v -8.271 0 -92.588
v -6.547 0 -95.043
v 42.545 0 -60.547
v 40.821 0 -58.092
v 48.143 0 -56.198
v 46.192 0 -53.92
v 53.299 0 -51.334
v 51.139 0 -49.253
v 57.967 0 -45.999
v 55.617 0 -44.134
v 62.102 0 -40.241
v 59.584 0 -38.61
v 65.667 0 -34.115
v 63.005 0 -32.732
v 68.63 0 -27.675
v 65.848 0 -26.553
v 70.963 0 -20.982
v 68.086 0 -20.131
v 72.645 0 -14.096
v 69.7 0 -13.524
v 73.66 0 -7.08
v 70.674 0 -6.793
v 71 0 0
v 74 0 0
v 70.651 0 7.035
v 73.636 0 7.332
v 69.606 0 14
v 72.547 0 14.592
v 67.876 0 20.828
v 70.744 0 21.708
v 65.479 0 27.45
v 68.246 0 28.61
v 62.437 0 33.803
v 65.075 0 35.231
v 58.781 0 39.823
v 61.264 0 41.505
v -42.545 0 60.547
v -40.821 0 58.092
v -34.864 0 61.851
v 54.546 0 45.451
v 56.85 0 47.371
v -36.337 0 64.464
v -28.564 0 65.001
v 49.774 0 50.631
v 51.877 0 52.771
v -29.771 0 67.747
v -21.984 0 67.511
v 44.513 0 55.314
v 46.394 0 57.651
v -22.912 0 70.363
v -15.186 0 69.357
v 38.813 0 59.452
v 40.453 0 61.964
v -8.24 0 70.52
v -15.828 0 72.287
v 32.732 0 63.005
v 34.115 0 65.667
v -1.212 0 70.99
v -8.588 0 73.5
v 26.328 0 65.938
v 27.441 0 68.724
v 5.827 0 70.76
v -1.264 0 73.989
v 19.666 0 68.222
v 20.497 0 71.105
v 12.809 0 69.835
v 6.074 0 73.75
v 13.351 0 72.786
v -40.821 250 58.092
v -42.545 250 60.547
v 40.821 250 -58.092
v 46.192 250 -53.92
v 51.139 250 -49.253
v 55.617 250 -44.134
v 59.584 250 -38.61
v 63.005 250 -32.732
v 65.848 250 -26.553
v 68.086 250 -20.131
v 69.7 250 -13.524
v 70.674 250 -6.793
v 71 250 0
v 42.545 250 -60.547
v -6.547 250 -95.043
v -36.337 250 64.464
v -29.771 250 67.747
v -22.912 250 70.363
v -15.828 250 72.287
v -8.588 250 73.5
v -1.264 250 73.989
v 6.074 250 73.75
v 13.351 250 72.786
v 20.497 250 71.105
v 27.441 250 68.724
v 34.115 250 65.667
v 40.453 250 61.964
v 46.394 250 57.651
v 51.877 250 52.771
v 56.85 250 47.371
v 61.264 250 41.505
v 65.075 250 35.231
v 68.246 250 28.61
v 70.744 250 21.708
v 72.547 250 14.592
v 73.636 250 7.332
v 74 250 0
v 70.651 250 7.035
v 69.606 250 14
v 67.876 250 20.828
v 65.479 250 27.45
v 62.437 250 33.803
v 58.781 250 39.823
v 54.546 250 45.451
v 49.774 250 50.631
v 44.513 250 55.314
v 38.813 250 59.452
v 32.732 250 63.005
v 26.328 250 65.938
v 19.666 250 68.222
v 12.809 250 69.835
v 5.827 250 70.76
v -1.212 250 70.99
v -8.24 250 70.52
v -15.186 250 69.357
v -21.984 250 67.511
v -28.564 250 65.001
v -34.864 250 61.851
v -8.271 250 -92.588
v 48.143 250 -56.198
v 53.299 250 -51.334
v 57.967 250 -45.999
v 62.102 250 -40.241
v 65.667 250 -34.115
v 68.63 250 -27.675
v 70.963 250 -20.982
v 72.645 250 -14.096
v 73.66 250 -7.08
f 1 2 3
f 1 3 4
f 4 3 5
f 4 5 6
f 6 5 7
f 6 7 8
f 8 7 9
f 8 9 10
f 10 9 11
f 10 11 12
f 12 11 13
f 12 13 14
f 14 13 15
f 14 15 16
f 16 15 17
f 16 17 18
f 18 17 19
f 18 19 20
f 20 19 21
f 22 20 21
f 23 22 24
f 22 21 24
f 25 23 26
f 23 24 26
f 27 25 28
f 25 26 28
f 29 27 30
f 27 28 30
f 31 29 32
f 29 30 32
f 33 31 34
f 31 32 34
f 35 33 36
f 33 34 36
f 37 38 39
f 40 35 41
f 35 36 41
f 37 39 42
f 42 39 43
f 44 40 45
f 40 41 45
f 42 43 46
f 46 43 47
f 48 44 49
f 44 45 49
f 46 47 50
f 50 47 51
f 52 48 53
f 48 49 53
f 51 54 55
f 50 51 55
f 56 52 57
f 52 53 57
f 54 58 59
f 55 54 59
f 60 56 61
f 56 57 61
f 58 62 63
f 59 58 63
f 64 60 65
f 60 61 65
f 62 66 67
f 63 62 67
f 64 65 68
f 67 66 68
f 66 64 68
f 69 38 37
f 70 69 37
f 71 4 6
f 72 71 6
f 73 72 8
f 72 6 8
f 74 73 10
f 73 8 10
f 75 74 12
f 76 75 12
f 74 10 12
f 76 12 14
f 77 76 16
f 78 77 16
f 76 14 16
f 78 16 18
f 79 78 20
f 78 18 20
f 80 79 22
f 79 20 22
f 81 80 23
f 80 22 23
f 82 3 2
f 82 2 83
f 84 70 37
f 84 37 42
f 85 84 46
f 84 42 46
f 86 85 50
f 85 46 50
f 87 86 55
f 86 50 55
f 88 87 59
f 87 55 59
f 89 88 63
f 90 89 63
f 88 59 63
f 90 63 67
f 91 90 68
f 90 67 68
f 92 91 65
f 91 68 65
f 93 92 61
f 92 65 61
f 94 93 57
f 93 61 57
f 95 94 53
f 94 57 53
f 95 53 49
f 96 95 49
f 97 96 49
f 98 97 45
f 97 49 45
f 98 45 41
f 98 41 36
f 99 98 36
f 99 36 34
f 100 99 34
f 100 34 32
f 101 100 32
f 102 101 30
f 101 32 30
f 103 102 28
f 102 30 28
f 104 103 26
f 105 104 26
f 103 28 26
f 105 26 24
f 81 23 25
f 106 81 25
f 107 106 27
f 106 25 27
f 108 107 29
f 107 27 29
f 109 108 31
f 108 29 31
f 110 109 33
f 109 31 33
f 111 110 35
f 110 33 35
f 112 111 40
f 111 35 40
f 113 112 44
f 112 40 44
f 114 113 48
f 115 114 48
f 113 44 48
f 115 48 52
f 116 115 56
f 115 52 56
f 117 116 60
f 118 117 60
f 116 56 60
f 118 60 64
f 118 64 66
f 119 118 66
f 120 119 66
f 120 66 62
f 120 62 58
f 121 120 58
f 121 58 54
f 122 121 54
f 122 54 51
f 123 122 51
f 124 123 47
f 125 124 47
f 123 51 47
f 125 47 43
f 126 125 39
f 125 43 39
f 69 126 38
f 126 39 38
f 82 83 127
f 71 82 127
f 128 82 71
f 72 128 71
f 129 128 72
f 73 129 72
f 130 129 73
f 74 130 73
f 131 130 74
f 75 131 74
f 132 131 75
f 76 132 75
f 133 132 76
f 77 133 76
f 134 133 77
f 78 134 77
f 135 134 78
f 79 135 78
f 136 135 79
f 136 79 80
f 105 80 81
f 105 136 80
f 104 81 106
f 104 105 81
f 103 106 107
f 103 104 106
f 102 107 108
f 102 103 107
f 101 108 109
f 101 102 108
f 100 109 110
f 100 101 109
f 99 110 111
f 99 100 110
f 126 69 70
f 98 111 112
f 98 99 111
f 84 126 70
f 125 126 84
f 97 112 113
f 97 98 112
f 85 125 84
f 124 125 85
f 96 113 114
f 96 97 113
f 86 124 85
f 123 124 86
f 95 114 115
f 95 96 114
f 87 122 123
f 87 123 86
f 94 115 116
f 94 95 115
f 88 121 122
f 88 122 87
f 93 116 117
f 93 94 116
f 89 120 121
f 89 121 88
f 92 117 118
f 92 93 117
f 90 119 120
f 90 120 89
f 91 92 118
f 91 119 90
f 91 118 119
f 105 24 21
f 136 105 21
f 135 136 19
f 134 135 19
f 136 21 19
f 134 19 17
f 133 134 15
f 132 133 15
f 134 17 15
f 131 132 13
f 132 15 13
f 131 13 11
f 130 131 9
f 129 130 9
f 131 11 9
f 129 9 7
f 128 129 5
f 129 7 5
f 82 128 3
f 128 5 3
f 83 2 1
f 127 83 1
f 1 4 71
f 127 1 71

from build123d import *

# Parameters (mm, degrees)
BOSS_EXTRU_1_DEPTH = 250
ESQUISSE7_W        = 3
ESQUISSE7_H        = 250
BOSS_EXTRU_4_DEPTH = 60


with BuildPart() as part:
    # Esquisse1 → Boss.-Extru.1 (new body)
    with BuildSketch(Plane(origin=(0, 0, 0), x_dir=(1, 0, 0), z_dir=(0, 1, 0))):
        with BuildLine():
            ThreePointArc((74, 0), (65.667169842, 34.11484728), (42.545329596, 60.546634337))
            Line((42.545329596, 60.546634337), (40.820518937, 58.092041053))
            ThreePointArc((40.820518937, 58.092041053), (63.004987281, 32.731812931), (71, 0))
            ThreePointArc((71, 0), (32.731812931, -63.004987281), (-40.820518937, -58.092041053))
            Line((-40.820518937, -58.092041053), (-42.545329596, -60.546634337))
            ThreePointArc((-42.545329596, -60.546634337), (34.11484728, -65.667169842), (74, 0))
        make_face()
    extrude(amount=BOSS_EXTRU_1_DEPTH)

    # Esquisse7 → Boss.-Extru.4 (add)
    with BuildSketch(Plane(origin=(0, 0, 0), x_dir=(-0.5749368864324517, 0, 0.8181977613140713), z_dir=(-0.8181977613140715, 0, -0.5749368864324517))):
        with Locations((-72.5, 125)):
            Rectangle(ESQUISSE7_W, ESQUISSE7_H)
    extrude(amount=BOSS_EXTRU_4_DEPTH)


solid = part.part
